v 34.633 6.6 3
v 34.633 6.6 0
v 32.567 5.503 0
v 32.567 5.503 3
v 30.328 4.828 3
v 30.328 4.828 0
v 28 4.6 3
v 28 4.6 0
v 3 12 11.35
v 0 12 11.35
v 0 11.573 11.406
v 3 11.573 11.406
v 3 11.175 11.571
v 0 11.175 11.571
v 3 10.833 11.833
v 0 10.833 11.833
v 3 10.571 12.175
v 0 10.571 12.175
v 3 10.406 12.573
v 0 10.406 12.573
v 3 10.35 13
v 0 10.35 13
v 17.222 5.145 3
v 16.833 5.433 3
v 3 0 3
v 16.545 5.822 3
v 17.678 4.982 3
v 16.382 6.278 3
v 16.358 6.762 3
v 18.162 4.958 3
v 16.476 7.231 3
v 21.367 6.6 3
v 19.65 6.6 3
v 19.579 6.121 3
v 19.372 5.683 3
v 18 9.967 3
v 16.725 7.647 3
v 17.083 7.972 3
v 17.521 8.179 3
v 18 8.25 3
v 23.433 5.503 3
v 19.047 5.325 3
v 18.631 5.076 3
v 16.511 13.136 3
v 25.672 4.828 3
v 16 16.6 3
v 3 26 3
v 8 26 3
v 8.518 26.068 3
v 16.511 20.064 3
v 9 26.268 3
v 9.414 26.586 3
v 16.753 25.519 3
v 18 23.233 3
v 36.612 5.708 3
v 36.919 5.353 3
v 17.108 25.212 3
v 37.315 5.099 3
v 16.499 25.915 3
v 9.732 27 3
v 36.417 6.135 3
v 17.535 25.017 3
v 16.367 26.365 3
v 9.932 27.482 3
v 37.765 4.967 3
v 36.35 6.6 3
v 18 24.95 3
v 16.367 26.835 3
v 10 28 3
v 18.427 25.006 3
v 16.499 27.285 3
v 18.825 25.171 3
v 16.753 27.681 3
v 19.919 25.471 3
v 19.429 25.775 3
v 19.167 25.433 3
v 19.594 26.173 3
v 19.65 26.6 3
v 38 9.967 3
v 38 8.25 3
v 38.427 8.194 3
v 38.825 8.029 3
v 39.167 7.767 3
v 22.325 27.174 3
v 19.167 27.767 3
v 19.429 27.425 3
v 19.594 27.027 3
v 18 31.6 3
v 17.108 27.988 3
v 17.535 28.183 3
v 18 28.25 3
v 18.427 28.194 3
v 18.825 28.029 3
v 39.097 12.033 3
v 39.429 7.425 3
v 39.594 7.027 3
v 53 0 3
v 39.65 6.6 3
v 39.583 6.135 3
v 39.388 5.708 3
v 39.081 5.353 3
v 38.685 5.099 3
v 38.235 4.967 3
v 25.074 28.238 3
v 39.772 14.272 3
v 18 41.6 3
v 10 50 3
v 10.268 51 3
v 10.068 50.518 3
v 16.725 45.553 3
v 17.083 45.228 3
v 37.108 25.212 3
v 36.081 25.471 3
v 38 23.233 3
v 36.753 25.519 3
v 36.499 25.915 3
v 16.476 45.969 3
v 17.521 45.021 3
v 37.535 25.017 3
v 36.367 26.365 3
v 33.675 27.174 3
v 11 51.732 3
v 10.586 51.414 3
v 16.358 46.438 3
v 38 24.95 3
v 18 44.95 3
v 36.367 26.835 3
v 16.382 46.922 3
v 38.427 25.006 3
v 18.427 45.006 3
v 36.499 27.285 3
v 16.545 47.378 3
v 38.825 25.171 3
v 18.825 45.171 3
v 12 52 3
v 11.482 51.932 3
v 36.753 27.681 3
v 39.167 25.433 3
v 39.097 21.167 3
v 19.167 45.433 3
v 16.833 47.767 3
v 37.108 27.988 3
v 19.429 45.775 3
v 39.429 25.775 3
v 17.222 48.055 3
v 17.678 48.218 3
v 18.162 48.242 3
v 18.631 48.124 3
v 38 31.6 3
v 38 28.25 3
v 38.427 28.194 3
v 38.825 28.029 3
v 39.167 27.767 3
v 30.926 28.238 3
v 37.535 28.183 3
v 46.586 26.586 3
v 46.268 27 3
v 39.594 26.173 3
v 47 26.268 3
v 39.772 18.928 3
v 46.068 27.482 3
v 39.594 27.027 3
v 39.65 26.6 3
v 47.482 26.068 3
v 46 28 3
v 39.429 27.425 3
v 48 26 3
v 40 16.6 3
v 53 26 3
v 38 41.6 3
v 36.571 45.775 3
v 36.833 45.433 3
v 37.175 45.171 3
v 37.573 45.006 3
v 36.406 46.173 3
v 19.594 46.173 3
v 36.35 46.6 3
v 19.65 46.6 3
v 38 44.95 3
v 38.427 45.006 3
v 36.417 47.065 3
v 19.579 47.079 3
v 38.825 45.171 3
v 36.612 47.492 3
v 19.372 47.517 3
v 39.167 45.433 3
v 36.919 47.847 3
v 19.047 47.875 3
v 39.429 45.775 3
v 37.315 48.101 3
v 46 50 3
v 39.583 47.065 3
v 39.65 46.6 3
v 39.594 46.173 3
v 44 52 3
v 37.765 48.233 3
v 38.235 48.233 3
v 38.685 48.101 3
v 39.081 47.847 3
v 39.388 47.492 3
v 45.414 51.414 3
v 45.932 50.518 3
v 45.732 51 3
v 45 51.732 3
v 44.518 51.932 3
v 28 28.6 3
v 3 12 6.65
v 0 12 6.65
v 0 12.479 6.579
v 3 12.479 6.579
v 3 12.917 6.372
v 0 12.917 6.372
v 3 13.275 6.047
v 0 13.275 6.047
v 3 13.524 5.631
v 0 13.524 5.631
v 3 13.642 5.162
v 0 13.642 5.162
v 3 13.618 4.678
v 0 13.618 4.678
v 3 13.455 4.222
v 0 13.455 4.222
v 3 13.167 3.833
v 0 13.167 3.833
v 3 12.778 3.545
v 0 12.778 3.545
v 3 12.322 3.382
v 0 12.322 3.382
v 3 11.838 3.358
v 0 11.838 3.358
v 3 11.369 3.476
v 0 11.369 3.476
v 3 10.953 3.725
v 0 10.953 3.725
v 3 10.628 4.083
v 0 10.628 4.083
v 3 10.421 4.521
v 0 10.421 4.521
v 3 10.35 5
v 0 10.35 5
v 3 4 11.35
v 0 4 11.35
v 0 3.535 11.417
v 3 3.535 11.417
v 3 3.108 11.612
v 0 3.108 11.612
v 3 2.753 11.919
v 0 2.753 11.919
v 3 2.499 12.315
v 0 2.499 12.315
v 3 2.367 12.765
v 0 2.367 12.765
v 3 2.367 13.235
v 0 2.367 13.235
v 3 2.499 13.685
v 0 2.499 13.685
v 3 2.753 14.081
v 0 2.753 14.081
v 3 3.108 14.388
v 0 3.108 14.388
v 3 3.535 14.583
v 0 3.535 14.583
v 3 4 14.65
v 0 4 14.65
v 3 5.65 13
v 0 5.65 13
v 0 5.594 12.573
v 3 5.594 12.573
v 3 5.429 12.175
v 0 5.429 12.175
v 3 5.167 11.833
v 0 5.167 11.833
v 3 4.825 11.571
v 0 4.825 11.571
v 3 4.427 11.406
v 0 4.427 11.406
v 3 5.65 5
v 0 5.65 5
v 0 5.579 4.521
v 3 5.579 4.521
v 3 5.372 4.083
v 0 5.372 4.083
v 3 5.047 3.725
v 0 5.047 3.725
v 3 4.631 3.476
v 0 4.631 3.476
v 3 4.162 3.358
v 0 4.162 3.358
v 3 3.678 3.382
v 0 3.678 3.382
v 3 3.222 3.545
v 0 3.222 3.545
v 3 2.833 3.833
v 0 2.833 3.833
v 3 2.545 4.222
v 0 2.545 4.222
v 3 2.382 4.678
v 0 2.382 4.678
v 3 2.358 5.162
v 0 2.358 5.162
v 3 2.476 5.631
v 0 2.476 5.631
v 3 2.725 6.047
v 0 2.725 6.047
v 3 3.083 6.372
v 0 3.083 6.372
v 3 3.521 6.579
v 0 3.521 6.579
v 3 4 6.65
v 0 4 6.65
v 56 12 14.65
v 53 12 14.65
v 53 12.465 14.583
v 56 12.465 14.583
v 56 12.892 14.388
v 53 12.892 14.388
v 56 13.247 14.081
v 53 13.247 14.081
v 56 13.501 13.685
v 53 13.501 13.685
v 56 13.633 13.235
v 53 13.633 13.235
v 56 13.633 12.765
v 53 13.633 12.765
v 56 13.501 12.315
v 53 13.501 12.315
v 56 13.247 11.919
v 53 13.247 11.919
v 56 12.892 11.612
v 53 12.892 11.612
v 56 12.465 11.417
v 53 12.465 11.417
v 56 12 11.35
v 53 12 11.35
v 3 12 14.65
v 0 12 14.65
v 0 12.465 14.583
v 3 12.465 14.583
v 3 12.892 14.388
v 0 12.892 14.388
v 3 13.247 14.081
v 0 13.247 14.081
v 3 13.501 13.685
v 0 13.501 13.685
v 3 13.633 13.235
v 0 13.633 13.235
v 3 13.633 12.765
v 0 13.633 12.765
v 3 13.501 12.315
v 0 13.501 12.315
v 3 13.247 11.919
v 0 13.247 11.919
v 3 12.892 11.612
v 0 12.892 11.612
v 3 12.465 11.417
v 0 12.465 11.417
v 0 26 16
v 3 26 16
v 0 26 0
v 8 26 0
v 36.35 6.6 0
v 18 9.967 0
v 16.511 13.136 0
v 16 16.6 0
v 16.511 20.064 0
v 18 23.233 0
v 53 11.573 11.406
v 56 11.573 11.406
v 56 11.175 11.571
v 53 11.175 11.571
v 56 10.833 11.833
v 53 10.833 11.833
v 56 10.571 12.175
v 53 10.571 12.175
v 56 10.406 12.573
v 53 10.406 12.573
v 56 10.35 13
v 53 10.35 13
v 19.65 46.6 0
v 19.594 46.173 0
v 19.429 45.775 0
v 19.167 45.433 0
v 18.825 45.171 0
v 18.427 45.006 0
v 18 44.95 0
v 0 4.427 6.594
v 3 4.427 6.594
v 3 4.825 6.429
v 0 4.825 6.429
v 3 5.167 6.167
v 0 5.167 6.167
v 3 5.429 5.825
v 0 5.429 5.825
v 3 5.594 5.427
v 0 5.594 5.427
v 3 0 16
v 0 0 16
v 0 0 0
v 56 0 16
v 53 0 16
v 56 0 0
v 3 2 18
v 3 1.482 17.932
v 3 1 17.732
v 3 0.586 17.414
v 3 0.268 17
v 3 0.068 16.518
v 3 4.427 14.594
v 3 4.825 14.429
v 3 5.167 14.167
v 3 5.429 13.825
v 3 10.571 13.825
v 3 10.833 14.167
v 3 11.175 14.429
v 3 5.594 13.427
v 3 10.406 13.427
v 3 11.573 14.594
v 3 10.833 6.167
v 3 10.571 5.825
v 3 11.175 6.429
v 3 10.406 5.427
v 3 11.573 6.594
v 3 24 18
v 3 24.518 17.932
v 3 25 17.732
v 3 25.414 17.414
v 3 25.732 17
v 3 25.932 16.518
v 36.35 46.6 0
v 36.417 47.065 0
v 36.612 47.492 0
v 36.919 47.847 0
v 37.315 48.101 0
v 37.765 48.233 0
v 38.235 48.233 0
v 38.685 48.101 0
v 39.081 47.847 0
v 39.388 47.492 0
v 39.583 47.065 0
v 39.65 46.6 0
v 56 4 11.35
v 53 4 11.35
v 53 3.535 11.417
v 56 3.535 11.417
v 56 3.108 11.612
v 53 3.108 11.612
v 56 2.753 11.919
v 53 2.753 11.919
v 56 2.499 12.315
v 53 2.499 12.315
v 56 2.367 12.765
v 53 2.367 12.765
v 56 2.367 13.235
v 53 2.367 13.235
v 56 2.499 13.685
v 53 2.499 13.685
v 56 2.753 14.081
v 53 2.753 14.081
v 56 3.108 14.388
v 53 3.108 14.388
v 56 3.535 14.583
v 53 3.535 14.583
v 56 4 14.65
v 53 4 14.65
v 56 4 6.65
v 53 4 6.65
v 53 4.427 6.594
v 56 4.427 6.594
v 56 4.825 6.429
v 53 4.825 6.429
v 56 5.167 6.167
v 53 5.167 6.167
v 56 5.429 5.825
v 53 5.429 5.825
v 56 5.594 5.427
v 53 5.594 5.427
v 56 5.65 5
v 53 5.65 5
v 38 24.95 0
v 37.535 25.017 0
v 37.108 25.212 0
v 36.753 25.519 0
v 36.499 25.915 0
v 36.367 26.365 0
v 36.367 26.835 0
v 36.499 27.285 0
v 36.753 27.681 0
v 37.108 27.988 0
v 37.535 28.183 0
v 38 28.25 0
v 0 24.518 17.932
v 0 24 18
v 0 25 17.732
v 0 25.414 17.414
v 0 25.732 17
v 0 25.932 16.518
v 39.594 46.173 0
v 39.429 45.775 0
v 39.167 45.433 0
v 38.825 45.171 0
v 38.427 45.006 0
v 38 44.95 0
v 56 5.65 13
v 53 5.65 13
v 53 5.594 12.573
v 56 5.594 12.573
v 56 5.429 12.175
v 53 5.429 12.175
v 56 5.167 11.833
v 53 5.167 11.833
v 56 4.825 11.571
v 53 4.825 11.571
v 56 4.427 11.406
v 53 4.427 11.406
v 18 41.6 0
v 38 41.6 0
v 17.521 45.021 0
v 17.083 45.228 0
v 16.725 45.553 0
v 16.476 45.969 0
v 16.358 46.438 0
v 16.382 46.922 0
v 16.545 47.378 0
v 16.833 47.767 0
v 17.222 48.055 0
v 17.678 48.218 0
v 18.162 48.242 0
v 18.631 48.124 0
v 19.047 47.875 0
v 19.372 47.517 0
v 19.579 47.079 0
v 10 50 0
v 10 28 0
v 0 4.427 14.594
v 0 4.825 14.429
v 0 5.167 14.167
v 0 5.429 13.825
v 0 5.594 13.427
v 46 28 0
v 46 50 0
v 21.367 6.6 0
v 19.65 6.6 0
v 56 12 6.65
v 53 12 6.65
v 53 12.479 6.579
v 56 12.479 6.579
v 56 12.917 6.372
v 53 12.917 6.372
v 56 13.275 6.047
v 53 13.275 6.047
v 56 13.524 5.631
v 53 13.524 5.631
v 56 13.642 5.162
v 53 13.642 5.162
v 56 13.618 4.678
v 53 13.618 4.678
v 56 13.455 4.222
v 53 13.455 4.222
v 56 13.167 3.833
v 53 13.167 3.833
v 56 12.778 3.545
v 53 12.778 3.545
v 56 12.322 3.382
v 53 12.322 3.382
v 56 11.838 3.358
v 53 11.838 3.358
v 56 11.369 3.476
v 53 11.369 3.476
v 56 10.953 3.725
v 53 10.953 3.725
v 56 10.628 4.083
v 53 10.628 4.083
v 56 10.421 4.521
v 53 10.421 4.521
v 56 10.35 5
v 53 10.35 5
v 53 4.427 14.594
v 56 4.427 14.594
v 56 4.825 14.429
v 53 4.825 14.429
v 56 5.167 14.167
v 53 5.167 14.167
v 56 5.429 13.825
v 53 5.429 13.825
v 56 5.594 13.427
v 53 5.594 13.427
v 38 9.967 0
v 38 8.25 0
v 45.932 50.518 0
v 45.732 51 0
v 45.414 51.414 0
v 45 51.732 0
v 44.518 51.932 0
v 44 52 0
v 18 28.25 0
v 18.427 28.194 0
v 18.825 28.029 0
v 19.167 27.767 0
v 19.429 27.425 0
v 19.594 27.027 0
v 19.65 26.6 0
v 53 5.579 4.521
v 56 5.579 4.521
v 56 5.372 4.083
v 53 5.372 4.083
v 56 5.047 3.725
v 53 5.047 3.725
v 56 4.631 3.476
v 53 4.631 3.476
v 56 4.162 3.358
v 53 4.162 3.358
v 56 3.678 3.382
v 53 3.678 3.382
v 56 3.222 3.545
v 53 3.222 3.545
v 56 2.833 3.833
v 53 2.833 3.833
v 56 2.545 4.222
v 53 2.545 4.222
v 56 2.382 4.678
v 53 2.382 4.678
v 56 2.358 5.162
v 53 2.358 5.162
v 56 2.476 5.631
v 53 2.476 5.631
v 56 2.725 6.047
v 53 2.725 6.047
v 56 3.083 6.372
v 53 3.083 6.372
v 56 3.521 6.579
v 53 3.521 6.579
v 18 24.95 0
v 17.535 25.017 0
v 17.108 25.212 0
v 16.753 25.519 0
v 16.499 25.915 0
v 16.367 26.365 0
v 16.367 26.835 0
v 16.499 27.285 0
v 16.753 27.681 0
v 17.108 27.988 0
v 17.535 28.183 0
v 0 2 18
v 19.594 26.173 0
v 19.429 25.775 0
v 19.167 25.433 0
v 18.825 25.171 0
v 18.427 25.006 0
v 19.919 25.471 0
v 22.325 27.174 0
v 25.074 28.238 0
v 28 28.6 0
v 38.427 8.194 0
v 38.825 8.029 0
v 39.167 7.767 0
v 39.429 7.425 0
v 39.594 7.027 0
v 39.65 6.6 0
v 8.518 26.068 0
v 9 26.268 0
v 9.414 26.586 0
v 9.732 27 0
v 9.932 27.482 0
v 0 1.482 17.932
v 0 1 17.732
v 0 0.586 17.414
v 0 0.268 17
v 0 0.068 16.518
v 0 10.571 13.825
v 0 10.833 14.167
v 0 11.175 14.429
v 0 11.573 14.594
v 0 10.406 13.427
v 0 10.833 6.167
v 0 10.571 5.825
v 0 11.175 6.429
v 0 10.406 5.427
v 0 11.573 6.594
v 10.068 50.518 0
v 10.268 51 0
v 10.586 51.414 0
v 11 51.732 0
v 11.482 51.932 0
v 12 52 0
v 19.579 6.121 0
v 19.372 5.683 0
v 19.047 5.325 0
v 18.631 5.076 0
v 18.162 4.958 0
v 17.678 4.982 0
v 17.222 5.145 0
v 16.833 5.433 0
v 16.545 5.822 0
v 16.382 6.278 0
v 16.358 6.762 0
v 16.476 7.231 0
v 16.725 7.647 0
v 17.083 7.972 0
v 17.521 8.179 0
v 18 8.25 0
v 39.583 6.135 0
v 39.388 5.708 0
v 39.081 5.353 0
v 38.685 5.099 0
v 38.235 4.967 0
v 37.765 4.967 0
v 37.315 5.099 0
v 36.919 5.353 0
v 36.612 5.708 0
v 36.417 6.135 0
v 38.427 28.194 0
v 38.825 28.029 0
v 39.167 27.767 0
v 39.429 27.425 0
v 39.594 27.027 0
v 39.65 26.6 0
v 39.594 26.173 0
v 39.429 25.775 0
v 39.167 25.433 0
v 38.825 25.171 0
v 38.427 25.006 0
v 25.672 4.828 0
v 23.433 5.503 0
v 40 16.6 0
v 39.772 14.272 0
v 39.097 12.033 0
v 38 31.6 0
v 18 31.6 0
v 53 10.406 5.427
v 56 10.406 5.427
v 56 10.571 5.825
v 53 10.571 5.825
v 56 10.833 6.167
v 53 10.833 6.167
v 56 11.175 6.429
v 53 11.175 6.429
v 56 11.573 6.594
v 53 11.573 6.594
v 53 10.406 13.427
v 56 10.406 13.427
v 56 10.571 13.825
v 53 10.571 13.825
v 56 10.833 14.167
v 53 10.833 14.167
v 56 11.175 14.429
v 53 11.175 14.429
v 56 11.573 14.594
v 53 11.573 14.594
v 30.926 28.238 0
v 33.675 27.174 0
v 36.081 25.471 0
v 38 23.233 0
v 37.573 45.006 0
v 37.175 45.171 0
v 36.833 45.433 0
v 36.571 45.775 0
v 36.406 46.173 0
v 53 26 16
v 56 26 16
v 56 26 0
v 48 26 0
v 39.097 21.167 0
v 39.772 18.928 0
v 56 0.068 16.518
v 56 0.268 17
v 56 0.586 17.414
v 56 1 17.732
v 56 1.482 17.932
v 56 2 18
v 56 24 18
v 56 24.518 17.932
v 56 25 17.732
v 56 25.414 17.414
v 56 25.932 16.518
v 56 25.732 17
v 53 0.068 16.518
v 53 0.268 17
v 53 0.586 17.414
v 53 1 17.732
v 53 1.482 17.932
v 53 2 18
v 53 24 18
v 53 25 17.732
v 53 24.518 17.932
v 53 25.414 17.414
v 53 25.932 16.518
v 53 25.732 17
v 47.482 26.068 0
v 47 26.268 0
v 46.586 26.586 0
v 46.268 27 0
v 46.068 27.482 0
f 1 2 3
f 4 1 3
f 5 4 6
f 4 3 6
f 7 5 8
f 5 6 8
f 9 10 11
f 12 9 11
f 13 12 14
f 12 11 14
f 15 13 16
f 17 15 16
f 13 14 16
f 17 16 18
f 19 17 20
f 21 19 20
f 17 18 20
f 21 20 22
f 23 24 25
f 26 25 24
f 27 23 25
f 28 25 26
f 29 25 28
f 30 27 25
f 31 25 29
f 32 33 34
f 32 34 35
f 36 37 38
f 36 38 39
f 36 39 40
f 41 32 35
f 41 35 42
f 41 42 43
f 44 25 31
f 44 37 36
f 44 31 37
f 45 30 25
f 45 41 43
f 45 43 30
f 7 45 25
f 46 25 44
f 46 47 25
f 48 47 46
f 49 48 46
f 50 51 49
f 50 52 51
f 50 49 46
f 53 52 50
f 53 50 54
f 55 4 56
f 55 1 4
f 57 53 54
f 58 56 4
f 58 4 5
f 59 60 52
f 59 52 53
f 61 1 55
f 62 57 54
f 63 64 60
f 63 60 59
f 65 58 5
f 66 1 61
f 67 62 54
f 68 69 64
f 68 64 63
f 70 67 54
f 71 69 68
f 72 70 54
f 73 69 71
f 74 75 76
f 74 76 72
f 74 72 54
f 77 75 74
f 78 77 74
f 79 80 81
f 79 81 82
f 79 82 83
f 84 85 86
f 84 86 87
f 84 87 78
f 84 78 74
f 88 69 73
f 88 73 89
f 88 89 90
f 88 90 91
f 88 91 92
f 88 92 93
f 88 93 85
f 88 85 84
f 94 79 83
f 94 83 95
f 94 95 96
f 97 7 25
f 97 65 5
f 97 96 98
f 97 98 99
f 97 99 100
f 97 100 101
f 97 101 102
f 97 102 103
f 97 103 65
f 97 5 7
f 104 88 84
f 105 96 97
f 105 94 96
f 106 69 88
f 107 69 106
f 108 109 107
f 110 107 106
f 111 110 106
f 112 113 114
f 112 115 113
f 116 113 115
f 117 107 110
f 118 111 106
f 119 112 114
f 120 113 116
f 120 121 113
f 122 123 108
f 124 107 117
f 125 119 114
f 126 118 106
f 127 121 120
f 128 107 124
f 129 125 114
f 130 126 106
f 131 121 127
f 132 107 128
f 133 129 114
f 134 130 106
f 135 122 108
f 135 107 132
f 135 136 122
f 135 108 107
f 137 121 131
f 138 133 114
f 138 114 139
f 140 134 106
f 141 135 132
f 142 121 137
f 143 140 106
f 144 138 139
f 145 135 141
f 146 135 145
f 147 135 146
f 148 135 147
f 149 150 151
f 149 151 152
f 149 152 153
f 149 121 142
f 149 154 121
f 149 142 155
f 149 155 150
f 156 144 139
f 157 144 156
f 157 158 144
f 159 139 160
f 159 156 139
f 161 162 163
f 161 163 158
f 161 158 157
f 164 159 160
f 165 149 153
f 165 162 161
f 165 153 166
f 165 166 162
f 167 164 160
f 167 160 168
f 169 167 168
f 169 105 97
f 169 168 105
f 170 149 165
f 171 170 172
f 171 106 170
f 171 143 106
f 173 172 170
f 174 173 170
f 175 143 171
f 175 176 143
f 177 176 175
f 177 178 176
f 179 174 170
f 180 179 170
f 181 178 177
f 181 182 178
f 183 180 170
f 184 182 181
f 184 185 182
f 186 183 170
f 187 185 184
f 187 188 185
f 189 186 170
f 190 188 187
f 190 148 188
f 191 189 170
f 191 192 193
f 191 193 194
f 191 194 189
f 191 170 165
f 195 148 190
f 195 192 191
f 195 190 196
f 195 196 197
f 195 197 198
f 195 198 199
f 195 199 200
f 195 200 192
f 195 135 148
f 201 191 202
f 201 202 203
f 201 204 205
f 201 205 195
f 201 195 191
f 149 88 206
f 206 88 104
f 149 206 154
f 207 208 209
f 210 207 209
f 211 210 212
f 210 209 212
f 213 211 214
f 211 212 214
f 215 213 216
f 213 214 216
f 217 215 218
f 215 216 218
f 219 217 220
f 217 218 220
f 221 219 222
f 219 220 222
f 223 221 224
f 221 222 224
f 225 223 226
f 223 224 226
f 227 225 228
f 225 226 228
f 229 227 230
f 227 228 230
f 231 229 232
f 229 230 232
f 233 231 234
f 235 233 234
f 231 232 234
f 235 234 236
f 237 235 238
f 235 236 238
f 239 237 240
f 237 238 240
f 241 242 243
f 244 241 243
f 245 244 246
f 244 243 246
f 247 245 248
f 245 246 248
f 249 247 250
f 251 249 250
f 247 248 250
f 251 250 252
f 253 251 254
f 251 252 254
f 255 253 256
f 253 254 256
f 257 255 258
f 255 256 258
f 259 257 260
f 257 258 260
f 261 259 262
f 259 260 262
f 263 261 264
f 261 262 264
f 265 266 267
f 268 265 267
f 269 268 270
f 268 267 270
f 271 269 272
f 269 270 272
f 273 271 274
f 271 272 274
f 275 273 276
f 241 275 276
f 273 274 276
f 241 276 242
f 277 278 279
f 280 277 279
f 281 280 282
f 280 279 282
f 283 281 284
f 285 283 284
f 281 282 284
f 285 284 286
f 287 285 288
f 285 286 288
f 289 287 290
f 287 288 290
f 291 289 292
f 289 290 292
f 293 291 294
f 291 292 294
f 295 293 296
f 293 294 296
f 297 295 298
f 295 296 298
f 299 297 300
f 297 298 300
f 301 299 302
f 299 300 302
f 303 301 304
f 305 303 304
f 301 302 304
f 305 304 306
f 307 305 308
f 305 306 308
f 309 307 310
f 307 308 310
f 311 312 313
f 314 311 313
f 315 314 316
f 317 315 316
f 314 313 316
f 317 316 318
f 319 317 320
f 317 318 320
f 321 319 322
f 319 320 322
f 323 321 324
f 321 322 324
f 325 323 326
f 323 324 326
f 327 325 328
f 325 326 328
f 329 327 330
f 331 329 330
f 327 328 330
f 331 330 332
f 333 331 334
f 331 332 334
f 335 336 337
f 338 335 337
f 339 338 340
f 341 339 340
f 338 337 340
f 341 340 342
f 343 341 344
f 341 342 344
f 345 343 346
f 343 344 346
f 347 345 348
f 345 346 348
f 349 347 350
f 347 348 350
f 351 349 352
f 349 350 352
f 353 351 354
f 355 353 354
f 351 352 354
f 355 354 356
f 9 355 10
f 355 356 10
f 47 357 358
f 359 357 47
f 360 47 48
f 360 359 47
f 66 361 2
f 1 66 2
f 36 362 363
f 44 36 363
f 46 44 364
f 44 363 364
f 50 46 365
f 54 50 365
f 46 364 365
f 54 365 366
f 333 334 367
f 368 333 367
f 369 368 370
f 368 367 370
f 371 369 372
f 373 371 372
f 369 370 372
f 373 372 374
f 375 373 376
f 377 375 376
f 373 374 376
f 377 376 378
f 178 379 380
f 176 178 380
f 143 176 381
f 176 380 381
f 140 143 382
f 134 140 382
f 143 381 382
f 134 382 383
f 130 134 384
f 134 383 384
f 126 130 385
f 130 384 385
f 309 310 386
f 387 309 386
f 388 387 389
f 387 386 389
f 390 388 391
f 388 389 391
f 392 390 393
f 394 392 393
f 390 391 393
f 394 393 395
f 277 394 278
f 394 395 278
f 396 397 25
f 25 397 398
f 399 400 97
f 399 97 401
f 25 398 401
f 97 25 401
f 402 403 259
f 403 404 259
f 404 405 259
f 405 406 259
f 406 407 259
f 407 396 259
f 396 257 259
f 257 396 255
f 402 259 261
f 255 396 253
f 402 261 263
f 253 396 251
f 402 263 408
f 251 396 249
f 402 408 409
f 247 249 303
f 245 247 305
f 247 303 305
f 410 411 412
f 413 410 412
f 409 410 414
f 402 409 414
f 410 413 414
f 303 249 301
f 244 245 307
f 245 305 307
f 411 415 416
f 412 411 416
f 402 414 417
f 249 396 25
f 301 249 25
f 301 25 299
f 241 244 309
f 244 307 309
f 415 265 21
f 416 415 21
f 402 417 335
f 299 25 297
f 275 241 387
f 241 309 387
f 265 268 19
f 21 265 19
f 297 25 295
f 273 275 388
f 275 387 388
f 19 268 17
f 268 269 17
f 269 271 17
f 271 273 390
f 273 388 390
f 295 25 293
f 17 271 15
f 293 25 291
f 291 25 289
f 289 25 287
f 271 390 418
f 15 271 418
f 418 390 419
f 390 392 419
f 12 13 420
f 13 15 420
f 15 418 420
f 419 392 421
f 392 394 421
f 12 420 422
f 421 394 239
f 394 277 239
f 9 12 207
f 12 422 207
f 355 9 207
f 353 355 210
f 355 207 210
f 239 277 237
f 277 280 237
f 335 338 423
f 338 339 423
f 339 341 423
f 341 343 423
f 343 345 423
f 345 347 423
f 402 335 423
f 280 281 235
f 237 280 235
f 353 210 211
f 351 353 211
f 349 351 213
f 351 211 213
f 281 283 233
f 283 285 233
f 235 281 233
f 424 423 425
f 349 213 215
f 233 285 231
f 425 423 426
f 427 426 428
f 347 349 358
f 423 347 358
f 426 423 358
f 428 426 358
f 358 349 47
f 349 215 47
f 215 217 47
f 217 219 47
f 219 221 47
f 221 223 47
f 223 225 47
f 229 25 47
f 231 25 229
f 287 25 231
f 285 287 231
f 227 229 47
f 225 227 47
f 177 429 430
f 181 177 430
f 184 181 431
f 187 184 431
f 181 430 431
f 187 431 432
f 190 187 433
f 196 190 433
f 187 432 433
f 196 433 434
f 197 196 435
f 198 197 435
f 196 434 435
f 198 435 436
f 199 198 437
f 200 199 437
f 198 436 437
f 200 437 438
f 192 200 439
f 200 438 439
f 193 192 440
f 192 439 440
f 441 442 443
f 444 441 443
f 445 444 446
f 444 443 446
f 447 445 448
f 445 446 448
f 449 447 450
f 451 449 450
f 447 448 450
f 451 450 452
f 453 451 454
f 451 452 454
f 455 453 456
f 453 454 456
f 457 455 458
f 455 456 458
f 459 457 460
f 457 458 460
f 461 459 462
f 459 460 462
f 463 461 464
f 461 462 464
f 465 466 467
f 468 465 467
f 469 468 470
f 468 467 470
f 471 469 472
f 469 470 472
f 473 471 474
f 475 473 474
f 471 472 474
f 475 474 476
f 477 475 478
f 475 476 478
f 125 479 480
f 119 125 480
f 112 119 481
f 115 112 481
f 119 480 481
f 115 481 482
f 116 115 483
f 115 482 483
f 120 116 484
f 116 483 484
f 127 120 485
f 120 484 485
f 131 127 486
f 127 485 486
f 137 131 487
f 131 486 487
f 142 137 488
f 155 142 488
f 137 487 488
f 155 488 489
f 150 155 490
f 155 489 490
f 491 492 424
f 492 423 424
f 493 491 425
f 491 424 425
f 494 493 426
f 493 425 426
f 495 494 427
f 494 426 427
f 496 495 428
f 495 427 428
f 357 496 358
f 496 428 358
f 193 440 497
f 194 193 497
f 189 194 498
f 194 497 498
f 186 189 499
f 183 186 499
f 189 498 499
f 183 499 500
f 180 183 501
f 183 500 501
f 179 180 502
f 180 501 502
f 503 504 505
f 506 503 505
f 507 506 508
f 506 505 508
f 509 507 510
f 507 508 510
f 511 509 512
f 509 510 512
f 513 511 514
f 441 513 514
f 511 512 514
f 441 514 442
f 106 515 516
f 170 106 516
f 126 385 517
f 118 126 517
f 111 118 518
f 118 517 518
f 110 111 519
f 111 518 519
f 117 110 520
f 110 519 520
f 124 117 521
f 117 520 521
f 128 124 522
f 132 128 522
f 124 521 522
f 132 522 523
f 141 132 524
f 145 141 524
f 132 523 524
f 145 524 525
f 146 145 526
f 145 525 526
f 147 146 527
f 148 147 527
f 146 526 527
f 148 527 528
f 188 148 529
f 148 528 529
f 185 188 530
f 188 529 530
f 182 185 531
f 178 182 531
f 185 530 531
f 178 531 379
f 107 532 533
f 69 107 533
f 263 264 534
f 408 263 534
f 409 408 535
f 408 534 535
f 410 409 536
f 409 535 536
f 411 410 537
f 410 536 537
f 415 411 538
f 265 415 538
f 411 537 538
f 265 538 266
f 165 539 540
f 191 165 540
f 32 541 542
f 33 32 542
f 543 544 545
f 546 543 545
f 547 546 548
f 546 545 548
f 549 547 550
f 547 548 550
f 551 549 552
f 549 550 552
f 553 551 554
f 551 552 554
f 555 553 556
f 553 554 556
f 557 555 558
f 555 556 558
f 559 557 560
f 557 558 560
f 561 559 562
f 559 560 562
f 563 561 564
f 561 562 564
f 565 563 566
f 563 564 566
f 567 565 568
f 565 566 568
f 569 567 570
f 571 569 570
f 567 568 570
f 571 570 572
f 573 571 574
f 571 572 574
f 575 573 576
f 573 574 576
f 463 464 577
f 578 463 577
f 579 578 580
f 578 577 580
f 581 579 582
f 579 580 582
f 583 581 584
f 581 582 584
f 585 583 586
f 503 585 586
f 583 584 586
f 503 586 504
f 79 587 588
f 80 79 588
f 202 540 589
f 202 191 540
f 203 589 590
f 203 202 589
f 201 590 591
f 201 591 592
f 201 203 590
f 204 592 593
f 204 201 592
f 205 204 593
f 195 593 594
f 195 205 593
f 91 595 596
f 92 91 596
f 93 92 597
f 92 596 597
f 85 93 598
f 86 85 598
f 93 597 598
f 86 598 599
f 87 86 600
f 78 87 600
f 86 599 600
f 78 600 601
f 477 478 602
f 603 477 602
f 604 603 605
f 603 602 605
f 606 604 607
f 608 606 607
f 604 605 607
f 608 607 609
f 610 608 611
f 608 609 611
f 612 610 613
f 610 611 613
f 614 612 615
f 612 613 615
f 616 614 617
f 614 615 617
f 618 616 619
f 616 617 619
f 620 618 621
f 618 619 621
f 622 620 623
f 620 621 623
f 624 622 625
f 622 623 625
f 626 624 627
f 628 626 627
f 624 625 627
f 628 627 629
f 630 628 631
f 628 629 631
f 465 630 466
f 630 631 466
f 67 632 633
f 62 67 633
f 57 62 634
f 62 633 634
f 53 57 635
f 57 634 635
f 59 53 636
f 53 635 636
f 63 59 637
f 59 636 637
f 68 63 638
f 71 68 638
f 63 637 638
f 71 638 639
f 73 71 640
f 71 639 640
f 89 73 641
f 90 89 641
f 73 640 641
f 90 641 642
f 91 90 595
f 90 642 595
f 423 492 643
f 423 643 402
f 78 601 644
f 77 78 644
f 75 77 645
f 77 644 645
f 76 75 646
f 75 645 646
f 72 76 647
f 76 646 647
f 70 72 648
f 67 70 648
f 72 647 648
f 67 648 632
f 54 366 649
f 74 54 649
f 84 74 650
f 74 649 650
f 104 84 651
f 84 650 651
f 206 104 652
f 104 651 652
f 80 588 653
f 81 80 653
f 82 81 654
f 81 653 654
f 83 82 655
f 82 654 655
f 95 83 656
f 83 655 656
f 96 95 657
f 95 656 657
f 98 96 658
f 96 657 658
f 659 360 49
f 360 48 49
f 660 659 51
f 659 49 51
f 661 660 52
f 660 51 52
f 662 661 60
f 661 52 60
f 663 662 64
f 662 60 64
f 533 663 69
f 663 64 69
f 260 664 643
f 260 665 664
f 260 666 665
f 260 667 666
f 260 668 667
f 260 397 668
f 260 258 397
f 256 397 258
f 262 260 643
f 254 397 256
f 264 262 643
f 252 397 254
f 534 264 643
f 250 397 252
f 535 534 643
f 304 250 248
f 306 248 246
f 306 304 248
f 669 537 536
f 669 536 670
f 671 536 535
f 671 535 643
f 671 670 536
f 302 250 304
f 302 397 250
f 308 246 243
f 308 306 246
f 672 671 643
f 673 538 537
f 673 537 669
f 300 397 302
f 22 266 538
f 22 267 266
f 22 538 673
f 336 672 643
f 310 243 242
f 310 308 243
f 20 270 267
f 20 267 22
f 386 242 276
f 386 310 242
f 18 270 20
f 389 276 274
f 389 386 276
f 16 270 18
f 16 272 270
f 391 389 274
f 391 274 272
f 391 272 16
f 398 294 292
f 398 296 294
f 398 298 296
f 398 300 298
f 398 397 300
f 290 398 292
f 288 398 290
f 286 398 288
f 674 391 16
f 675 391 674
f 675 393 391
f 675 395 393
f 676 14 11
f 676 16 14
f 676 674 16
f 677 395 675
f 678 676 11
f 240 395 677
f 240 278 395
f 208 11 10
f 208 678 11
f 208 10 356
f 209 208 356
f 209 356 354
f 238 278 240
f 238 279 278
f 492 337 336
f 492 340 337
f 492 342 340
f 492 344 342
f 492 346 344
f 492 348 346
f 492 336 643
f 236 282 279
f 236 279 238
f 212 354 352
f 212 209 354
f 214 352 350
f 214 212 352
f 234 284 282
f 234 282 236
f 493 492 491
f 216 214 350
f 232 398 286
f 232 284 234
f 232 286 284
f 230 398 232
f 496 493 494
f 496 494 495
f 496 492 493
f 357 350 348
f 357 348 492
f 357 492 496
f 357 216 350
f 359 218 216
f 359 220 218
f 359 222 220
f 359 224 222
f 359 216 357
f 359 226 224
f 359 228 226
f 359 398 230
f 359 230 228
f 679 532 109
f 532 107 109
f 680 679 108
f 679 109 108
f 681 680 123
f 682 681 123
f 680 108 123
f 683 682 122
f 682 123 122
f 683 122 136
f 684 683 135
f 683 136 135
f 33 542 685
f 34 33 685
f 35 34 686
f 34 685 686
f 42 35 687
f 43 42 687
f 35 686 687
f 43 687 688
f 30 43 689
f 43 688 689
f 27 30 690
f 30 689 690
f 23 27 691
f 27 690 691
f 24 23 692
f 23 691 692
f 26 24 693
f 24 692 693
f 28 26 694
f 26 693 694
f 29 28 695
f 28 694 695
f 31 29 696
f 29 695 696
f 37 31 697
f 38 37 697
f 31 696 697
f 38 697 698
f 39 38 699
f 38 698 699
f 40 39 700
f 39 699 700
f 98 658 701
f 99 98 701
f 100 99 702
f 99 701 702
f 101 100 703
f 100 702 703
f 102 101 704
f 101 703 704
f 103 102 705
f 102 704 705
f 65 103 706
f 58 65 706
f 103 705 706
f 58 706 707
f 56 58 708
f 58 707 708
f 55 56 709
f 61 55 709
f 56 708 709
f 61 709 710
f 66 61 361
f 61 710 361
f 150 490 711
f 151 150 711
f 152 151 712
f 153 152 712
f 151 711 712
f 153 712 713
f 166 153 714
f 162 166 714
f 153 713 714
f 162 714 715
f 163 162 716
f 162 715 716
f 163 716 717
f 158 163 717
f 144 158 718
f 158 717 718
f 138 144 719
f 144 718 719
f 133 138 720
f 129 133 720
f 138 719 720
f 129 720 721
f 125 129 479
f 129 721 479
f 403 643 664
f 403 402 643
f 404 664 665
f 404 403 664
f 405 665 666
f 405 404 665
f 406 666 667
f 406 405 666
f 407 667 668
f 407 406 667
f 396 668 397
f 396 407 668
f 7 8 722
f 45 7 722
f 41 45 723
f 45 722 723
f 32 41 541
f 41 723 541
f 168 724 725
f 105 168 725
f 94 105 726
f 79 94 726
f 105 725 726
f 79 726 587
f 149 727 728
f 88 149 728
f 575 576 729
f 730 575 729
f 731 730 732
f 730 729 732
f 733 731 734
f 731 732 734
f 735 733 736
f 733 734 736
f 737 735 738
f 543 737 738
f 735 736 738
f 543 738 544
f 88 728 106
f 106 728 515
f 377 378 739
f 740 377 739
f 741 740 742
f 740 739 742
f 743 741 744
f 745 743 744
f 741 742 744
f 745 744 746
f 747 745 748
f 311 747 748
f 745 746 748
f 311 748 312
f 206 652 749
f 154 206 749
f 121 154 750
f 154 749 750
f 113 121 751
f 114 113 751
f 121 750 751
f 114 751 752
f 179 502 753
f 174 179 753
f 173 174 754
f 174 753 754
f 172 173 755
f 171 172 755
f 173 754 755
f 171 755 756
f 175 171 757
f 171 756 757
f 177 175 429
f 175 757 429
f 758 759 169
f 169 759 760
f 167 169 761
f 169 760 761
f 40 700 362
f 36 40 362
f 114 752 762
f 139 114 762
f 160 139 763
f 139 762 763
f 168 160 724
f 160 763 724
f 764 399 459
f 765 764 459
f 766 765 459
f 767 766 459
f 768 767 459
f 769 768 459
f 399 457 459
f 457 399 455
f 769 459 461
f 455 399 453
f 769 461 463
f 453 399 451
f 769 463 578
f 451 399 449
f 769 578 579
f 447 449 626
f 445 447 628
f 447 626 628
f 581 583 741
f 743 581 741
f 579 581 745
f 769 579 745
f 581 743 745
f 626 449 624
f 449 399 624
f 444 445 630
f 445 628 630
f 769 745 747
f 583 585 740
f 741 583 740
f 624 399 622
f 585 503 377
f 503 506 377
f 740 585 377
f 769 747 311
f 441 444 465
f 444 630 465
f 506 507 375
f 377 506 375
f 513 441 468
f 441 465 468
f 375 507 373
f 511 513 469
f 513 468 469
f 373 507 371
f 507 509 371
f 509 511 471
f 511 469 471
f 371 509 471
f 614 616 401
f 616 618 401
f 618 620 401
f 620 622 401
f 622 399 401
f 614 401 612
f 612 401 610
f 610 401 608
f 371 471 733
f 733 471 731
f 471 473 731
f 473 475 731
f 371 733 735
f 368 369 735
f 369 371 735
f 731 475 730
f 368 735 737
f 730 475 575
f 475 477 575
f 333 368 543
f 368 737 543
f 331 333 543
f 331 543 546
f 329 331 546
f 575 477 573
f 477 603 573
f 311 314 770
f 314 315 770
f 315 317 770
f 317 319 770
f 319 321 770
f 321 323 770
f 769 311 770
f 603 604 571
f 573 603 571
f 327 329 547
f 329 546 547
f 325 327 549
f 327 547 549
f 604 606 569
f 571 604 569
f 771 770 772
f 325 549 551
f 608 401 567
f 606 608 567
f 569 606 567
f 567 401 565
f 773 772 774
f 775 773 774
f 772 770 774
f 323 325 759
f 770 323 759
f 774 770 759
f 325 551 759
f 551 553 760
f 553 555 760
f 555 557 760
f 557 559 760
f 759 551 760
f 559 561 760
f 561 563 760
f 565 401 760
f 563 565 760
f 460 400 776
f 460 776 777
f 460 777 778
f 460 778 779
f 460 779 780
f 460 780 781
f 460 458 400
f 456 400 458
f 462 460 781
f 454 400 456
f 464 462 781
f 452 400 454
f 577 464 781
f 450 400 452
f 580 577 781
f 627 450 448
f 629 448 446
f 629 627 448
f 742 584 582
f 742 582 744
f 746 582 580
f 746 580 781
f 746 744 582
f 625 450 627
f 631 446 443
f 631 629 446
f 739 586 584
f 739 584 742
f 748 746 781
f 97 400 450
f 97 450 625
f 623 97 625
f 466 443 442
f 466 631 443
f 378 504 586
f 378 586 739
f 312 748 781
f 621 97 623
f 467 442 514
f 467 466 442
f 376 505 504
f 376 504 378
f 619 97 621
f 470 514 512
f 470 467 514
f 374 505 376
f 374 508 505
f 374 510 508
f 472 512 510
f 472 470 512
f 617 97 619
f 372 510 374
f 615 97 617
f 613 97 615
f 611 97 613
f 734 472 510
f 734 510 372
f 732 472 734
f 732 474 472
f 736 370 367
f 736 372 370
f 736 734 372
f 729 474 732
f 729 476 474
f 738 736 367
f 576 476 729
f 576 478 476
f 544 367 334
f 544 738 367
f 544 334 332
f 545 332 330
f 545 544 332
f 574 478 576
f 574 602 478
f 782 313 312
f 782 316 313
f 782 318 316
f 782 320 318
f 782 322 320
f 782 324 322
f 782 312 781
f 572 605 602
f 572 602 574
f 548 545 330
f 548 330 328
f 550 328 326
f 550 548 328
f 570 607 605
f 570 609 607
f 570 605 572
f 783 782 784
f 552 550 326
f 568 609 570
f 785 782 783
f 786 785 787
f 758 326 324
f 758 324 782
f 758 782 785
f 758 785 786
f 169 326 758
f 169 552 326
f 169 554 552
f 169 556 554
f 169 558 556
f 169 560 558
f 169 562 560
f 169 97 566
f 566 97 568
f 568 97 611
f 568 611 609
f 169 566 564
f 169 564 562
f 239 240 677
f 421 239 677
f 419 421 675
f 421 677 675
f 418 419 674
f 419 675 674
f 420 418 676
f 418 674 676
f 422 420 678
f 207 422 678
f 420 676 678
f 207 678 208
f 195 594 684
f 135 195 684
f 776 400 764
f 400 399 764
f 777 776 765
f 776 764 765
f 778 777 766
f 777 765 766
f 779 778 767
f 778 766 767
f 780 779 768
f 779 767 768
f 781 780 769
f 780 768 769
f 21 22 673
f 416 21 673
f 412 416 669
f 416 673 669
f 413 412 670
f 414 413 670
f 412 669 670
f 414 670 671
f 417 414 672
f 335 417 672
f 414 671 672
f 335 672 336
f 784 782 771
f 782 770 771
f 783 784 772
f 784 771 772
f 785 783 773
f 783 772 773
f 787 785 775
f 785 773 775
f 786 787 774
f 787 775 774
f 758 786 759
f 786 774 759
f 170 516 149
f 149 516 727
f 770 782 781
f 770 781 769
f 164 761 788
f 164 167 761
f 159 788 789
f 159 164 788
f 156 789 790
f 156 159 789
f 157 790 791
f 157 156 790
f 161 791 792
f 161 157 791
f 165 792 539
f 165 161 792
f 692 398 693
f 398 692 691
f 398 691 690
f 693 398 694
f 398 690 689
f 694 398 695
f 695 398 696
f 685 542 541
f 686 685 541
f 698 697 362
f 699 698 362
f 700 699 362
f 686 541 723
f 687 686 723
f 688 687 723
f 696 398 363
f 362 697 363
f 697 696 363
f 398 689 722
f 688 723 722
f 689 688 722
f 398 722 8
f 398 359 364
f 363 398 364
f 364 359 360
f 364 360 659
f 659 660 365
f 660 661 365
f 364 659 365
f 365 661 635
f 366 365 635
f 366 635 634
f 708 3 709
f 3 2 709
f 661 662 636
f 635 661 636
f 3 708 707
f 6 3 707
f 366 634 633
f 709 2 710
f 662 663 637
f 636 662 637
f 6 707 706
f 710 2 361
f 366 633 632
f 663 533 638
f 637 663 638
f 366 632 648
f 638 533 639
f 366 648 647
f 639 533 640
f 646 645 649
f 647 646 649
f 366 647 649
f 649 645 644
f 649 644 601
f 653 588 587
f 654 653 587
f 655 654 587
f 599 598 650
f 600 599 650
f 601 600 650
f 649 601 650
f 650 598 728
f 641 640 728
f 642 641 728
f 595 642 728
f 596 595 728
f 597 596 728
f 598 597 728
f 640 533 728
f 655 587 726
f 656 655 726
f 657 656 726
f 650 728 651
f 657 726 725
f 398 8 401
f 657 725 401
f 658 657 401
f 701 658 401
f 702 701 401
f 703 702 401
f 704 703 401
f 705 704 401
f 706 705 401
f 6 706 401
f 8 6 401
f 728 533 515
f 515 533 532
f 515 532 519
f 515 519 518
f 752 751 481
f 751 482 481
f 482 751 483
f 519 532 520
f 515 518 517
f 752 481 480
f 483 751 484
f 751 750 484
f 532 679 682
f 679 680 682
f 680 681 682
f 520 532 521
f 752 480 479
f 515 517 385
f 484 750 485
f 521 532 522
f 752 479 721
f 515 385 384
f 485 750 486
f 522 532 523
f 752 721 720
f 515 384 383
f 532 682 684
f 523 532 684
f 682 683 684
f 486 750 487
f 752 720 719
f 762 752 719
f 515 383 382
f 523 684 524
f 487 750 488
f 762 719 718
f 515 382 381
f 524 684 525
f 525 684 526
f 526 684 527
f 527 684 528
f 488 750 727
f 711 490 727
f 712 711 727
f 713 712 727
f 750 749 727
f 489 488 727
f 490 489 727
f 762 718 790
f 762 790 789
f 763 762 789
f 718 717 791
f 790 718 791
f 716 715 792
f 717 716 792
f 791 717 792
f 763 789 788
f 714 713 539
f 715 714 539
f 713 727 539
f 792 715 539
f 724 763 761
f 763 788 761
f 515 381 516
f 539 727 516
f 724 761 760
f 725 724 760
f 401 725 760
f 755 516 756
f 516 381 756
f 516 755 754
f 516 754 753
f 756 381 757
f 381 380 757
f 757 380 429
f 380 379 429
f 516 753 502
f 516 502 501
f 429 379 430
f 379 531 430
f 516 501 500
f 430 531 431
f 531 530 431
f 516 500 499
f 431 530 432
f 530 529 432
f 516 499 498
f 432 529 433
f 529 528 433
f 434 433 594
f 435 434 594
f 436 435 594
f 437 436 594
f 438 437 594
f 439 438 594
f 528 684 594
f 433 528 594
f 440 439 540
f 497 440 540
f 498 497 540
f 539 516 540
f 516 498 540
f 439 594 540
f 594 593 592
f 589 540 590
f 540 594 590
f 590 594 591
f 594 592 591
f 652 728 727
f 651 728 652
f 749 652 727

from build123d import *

# Parameters (mm, degrees)
SKETCH_1_W          = 3
SKETCH_1_H          = 26
EXTRUDE_4_DEPTH     = 3
SKETCH_2_W          = 3
SKETCH_2_H          = 26
EXTRUDE_5_DEPTH     = 15
CUT_EXTRUDE_2_DEPTH = 56
FILLET_2_R          = 2


with BuildPart() as part:
    # 草图1 → 凸台-拉伸4 (new body)
    with BuildSketch(Plane.XY):
        with BuildLine():
            Line((10, 26), (3, 26))
            Line((3, 26), (3, 0))
            Line((3, 0), (28, 0))
            Line((28, 0), (28, 4.6))
            ThreePointArc((28, 4.6), (24.535898385, 5.110874707), (21.366750419, 6.6))
            Line((21.366750419, 6.6), (19.65, 6.6))
            ThreePointArc((19.65, 6.6), (16.833273811, 5.433273811), (18, 8.25))
            Line((18, 8.25), (18, 9.966750419))
            ThreePointArc((18, 9.966750419), (16, 16.6), (18, 23.233249581))
            Line((18, 23.233249581), (18, 24.95))
            ThreePointArc((18, 24.95), (16.35, 26.6), (18, 28.25))
            Line((18, 28.25), (18, 31.6))
            Line((18, 31.6), (18, 41.6))
            Line((18, 41.6), (18, 44.95))
            ThreePointArc((18, 44.95), (16.833273811, 47.766726189), (19.65, 46.6))
            Line((19.65, 46.6), (28, 46.6))
            Line((28, 46.6), (28, 52))
            Line((28, 52), (10, 52))
            Line((10, 52), (10, 26))
        make_face()
        with BuildLine():
            Line((28, 4.6), (28, 0))
            Line((28, 0), (53, 0))
            Line((53, 0), (53, 26))
            Line((53, 26), (46, 26))
            Line((46, 26), (46, 52))
            Line((46, 52), (28, 52))
            Line((28, 52), (28, 46.6))
            Line((28, 46.6), (36.35, 46.6))
            ThreePointArc((36.35, 46.6), (38, 48.25), (39.65, 46.6))
            ThreePointArc((39.65, 46.6), (39.166726189, 45.433273811), (38, 44.95))
            Line((38, 44.95), (38, 41.6))
            Line((38, 41.6), (38, 31.6))
            Line((38, 31.6), (38, 28.25))
            ThreePointArc((38, 28.25), (39.166726189, 27.766726189), (39.65, 26.6))
            ThreePointArc((39.65, 26.6), (39.166726189, 25.433273811), (38, 24.95))
            Line((38, 24.95), (38, 23.233249581))
            ThreePointArc((38, 23.233249581), (39.489125293, 20.064101615), (40, 16.6))
            ThreePointArc((40, 16.6), (39.489125293, 13.135898385), (38, 9.966750419))
            Line((38, 9.966750419), (38, 8.25))
            ThreePointArc((38, 8.25), (39.166726189, 7.766726189), (39.65, 6.6))
            ThreePointArc((39.65, 6.6), (38, 4.95), (36.35, 6.6))
            Line((36.35, 6.6), (34.633249581, 6.6))
            ThreePointArc((34.633249581, 6.6), (31.464101615, 5.110874707), (28, 4.6))
        make_face()
        with Locations((54.5, 13)):
            Rectangle(SKETCH_1_W, SKETCH_1_H)
        with Locations((1.5, 13)):
            Rectangle(SKETCH_1_W, SKETCH_1_H)
        with BuildLine():
            ThreePointArc((18, 23.233249581), (22.325451338, 27.173528147), (28, 28.6))
            Line((28, 28.6), (28, 31.6))
            Line((28, 31.6), (23, 31.6))
            Line((23, 31.6), (18, 31.6))
            Line((18, 31.6), (18, 28.25))
            ThreePointArc((18, 28.25), (19.166726189, 27.766726189), (19.65, 26.6))
            ThreePointArc((19.65, 26.6), (19.166726189, 25.433273811), (18, 24.95))
            Line((18, 24.95), (18, 23.233249581))
        make_face()
        with BuildLine():
            Line((28, 31.6), (28, 28.6))
            ThreePointArc((28, 28.6), (33.674548662, 27.173528147), (38, 23.233249581))
            Line((38, 23.233249581), (38, 24.95))
            ThreePointArc((38, 24.95), (36.35, 26.6), (38, 28.25))
            Line((38, 28.25), (38, 31.6))
            Line((38, 31.6), (28, 31.6))
        make_face()
        with BuildLine():
            Line((28, 41.6), (28, 46.6))
            Line((28, 46.6), (19.65, 46.6))
            ThreePointArc((19.65, 46.6), (19.166726189, 45.433273811), (18, 44.95))
            Line((18, 44.95), (18, 41.6))
            Line((18, 41.6), (28, 41.6))
        make_face()
        with BuildLine():
            Line((36.35, 46.6), (28, 46.6))
            Line((28, 46.6), (28, 41.6))
            Line((28, 41.6), (33, 41.6))
            Line((33, 41.6), (38, 41.6))
            Line((38, 41.6), (38, 44.95))
            ThreePointArc((38, 44.95), (36.833273811, 45.433273811), (36.35, 46.6))
        make_face()
    extrude(amount=EXTRUDE_4_DEPTH)

    # 草图2 → 凸台-拉伸5 (add)
    with BuildSketch(Plane.XY.offset(3)):
        with Locations((1.5, 13)):
            Rectangle(SKETCH_2_W, SKETCH_2_H)
        with Locations((54.5, 13)):
            Rectangle(SKETCH_2_W, SKETCH_2_H)
    extrude(amount=EXTRUDE_5_DEPTH)

    # 草图5 → 切除-拉伸2 (cut)
    with BuildSketch(Plane.ZY):
        with BuildLine():
            ThreePointArc((5, 10.35), (6.166726189, 10.833273811), (6.65, 12))
            Line((6.65, 12), (5, 12))
            Line((5, 12), (5, 10.35))
        make_face()
        with BuildLine():
            Line((5, 12), (6.65, 12))
            ThreePointArc((6.65, 12), (3.833273811, 13.166726189), (5, 10.35))
            Line((5, 10.35), (5, 12))
        make_face()
        with BuildLine():
            ThreePointArc((11.35, 12), (11.833273811, 10.833273811), (13, 10.35))
            Line((13, 10.35), (13, 12))
            Line((13, 12), (11.35, 12))
        make_face()
        with BuildLine():
            Line((13, 12), (13, 10.35))
            ThreePointArc((13, 10.35), (14.166726189, 10.833273811), (14.65, 12))
            ThreePointArc((14.65, 12), (13, 13.65), (11.35, 12))
            Line((11.35, 12), (13, 12))
        make_face()
        with BuildLine():
            ThreePointArc((6.65, 4), (6.166726189, 5.166726189), (5, 5.65))
            Line((5, 5.65), (5, 4))
            Line((5, 4), (6.65, 4))
        make_face()
        with BuildLine():
            Line((5, 4), (5, 5.65))
            ThreePointArc((5, 5.65), (3.833273811, 2.833273811), (6.65, 4))
            Line((6.65, 4), (5, 4))
        make_face()
        with BuildLine():
            ThreePointArc((14.65, 4), (14.166726189, 5.166726189), (13, 5.65))
            Line((13, 5.65), (13, 4))
            Line((13, 4), (11.35, 4))
            ThreePointArc((11.35, 4), (13, 2.35), (14.65, 4))
        make_face()
        with BuildLine():
            Line((13, 4), (13, 5.65))
            ThreePointArc((13, 5.65), (11.833273811, 5.166726189), (11.35, 4))
            Line((11.35, 4), (13, 4))
        make_face()
    extrude(amount=-CUT_EXTRUDE_2_DEPTH, mode=Mode.SUBTRACT)

    # 圆角2
    fillet_2_edges = [part.edges().sort_by_distance(p)[0] for p in [
        (46, 26, 1.5),
        (10, 26, 1.5),
        (10, 52, 1.5),
        (46, 52, 1.5),
        (1.5, 26, 18),
        (1.5, 0, 18),
        (54.5, 26, 18),
        (54.5, 0, 18),
    ]]
    fillet(fillet_2_edges, radius=FILLET_2_R)


solid = part.part
